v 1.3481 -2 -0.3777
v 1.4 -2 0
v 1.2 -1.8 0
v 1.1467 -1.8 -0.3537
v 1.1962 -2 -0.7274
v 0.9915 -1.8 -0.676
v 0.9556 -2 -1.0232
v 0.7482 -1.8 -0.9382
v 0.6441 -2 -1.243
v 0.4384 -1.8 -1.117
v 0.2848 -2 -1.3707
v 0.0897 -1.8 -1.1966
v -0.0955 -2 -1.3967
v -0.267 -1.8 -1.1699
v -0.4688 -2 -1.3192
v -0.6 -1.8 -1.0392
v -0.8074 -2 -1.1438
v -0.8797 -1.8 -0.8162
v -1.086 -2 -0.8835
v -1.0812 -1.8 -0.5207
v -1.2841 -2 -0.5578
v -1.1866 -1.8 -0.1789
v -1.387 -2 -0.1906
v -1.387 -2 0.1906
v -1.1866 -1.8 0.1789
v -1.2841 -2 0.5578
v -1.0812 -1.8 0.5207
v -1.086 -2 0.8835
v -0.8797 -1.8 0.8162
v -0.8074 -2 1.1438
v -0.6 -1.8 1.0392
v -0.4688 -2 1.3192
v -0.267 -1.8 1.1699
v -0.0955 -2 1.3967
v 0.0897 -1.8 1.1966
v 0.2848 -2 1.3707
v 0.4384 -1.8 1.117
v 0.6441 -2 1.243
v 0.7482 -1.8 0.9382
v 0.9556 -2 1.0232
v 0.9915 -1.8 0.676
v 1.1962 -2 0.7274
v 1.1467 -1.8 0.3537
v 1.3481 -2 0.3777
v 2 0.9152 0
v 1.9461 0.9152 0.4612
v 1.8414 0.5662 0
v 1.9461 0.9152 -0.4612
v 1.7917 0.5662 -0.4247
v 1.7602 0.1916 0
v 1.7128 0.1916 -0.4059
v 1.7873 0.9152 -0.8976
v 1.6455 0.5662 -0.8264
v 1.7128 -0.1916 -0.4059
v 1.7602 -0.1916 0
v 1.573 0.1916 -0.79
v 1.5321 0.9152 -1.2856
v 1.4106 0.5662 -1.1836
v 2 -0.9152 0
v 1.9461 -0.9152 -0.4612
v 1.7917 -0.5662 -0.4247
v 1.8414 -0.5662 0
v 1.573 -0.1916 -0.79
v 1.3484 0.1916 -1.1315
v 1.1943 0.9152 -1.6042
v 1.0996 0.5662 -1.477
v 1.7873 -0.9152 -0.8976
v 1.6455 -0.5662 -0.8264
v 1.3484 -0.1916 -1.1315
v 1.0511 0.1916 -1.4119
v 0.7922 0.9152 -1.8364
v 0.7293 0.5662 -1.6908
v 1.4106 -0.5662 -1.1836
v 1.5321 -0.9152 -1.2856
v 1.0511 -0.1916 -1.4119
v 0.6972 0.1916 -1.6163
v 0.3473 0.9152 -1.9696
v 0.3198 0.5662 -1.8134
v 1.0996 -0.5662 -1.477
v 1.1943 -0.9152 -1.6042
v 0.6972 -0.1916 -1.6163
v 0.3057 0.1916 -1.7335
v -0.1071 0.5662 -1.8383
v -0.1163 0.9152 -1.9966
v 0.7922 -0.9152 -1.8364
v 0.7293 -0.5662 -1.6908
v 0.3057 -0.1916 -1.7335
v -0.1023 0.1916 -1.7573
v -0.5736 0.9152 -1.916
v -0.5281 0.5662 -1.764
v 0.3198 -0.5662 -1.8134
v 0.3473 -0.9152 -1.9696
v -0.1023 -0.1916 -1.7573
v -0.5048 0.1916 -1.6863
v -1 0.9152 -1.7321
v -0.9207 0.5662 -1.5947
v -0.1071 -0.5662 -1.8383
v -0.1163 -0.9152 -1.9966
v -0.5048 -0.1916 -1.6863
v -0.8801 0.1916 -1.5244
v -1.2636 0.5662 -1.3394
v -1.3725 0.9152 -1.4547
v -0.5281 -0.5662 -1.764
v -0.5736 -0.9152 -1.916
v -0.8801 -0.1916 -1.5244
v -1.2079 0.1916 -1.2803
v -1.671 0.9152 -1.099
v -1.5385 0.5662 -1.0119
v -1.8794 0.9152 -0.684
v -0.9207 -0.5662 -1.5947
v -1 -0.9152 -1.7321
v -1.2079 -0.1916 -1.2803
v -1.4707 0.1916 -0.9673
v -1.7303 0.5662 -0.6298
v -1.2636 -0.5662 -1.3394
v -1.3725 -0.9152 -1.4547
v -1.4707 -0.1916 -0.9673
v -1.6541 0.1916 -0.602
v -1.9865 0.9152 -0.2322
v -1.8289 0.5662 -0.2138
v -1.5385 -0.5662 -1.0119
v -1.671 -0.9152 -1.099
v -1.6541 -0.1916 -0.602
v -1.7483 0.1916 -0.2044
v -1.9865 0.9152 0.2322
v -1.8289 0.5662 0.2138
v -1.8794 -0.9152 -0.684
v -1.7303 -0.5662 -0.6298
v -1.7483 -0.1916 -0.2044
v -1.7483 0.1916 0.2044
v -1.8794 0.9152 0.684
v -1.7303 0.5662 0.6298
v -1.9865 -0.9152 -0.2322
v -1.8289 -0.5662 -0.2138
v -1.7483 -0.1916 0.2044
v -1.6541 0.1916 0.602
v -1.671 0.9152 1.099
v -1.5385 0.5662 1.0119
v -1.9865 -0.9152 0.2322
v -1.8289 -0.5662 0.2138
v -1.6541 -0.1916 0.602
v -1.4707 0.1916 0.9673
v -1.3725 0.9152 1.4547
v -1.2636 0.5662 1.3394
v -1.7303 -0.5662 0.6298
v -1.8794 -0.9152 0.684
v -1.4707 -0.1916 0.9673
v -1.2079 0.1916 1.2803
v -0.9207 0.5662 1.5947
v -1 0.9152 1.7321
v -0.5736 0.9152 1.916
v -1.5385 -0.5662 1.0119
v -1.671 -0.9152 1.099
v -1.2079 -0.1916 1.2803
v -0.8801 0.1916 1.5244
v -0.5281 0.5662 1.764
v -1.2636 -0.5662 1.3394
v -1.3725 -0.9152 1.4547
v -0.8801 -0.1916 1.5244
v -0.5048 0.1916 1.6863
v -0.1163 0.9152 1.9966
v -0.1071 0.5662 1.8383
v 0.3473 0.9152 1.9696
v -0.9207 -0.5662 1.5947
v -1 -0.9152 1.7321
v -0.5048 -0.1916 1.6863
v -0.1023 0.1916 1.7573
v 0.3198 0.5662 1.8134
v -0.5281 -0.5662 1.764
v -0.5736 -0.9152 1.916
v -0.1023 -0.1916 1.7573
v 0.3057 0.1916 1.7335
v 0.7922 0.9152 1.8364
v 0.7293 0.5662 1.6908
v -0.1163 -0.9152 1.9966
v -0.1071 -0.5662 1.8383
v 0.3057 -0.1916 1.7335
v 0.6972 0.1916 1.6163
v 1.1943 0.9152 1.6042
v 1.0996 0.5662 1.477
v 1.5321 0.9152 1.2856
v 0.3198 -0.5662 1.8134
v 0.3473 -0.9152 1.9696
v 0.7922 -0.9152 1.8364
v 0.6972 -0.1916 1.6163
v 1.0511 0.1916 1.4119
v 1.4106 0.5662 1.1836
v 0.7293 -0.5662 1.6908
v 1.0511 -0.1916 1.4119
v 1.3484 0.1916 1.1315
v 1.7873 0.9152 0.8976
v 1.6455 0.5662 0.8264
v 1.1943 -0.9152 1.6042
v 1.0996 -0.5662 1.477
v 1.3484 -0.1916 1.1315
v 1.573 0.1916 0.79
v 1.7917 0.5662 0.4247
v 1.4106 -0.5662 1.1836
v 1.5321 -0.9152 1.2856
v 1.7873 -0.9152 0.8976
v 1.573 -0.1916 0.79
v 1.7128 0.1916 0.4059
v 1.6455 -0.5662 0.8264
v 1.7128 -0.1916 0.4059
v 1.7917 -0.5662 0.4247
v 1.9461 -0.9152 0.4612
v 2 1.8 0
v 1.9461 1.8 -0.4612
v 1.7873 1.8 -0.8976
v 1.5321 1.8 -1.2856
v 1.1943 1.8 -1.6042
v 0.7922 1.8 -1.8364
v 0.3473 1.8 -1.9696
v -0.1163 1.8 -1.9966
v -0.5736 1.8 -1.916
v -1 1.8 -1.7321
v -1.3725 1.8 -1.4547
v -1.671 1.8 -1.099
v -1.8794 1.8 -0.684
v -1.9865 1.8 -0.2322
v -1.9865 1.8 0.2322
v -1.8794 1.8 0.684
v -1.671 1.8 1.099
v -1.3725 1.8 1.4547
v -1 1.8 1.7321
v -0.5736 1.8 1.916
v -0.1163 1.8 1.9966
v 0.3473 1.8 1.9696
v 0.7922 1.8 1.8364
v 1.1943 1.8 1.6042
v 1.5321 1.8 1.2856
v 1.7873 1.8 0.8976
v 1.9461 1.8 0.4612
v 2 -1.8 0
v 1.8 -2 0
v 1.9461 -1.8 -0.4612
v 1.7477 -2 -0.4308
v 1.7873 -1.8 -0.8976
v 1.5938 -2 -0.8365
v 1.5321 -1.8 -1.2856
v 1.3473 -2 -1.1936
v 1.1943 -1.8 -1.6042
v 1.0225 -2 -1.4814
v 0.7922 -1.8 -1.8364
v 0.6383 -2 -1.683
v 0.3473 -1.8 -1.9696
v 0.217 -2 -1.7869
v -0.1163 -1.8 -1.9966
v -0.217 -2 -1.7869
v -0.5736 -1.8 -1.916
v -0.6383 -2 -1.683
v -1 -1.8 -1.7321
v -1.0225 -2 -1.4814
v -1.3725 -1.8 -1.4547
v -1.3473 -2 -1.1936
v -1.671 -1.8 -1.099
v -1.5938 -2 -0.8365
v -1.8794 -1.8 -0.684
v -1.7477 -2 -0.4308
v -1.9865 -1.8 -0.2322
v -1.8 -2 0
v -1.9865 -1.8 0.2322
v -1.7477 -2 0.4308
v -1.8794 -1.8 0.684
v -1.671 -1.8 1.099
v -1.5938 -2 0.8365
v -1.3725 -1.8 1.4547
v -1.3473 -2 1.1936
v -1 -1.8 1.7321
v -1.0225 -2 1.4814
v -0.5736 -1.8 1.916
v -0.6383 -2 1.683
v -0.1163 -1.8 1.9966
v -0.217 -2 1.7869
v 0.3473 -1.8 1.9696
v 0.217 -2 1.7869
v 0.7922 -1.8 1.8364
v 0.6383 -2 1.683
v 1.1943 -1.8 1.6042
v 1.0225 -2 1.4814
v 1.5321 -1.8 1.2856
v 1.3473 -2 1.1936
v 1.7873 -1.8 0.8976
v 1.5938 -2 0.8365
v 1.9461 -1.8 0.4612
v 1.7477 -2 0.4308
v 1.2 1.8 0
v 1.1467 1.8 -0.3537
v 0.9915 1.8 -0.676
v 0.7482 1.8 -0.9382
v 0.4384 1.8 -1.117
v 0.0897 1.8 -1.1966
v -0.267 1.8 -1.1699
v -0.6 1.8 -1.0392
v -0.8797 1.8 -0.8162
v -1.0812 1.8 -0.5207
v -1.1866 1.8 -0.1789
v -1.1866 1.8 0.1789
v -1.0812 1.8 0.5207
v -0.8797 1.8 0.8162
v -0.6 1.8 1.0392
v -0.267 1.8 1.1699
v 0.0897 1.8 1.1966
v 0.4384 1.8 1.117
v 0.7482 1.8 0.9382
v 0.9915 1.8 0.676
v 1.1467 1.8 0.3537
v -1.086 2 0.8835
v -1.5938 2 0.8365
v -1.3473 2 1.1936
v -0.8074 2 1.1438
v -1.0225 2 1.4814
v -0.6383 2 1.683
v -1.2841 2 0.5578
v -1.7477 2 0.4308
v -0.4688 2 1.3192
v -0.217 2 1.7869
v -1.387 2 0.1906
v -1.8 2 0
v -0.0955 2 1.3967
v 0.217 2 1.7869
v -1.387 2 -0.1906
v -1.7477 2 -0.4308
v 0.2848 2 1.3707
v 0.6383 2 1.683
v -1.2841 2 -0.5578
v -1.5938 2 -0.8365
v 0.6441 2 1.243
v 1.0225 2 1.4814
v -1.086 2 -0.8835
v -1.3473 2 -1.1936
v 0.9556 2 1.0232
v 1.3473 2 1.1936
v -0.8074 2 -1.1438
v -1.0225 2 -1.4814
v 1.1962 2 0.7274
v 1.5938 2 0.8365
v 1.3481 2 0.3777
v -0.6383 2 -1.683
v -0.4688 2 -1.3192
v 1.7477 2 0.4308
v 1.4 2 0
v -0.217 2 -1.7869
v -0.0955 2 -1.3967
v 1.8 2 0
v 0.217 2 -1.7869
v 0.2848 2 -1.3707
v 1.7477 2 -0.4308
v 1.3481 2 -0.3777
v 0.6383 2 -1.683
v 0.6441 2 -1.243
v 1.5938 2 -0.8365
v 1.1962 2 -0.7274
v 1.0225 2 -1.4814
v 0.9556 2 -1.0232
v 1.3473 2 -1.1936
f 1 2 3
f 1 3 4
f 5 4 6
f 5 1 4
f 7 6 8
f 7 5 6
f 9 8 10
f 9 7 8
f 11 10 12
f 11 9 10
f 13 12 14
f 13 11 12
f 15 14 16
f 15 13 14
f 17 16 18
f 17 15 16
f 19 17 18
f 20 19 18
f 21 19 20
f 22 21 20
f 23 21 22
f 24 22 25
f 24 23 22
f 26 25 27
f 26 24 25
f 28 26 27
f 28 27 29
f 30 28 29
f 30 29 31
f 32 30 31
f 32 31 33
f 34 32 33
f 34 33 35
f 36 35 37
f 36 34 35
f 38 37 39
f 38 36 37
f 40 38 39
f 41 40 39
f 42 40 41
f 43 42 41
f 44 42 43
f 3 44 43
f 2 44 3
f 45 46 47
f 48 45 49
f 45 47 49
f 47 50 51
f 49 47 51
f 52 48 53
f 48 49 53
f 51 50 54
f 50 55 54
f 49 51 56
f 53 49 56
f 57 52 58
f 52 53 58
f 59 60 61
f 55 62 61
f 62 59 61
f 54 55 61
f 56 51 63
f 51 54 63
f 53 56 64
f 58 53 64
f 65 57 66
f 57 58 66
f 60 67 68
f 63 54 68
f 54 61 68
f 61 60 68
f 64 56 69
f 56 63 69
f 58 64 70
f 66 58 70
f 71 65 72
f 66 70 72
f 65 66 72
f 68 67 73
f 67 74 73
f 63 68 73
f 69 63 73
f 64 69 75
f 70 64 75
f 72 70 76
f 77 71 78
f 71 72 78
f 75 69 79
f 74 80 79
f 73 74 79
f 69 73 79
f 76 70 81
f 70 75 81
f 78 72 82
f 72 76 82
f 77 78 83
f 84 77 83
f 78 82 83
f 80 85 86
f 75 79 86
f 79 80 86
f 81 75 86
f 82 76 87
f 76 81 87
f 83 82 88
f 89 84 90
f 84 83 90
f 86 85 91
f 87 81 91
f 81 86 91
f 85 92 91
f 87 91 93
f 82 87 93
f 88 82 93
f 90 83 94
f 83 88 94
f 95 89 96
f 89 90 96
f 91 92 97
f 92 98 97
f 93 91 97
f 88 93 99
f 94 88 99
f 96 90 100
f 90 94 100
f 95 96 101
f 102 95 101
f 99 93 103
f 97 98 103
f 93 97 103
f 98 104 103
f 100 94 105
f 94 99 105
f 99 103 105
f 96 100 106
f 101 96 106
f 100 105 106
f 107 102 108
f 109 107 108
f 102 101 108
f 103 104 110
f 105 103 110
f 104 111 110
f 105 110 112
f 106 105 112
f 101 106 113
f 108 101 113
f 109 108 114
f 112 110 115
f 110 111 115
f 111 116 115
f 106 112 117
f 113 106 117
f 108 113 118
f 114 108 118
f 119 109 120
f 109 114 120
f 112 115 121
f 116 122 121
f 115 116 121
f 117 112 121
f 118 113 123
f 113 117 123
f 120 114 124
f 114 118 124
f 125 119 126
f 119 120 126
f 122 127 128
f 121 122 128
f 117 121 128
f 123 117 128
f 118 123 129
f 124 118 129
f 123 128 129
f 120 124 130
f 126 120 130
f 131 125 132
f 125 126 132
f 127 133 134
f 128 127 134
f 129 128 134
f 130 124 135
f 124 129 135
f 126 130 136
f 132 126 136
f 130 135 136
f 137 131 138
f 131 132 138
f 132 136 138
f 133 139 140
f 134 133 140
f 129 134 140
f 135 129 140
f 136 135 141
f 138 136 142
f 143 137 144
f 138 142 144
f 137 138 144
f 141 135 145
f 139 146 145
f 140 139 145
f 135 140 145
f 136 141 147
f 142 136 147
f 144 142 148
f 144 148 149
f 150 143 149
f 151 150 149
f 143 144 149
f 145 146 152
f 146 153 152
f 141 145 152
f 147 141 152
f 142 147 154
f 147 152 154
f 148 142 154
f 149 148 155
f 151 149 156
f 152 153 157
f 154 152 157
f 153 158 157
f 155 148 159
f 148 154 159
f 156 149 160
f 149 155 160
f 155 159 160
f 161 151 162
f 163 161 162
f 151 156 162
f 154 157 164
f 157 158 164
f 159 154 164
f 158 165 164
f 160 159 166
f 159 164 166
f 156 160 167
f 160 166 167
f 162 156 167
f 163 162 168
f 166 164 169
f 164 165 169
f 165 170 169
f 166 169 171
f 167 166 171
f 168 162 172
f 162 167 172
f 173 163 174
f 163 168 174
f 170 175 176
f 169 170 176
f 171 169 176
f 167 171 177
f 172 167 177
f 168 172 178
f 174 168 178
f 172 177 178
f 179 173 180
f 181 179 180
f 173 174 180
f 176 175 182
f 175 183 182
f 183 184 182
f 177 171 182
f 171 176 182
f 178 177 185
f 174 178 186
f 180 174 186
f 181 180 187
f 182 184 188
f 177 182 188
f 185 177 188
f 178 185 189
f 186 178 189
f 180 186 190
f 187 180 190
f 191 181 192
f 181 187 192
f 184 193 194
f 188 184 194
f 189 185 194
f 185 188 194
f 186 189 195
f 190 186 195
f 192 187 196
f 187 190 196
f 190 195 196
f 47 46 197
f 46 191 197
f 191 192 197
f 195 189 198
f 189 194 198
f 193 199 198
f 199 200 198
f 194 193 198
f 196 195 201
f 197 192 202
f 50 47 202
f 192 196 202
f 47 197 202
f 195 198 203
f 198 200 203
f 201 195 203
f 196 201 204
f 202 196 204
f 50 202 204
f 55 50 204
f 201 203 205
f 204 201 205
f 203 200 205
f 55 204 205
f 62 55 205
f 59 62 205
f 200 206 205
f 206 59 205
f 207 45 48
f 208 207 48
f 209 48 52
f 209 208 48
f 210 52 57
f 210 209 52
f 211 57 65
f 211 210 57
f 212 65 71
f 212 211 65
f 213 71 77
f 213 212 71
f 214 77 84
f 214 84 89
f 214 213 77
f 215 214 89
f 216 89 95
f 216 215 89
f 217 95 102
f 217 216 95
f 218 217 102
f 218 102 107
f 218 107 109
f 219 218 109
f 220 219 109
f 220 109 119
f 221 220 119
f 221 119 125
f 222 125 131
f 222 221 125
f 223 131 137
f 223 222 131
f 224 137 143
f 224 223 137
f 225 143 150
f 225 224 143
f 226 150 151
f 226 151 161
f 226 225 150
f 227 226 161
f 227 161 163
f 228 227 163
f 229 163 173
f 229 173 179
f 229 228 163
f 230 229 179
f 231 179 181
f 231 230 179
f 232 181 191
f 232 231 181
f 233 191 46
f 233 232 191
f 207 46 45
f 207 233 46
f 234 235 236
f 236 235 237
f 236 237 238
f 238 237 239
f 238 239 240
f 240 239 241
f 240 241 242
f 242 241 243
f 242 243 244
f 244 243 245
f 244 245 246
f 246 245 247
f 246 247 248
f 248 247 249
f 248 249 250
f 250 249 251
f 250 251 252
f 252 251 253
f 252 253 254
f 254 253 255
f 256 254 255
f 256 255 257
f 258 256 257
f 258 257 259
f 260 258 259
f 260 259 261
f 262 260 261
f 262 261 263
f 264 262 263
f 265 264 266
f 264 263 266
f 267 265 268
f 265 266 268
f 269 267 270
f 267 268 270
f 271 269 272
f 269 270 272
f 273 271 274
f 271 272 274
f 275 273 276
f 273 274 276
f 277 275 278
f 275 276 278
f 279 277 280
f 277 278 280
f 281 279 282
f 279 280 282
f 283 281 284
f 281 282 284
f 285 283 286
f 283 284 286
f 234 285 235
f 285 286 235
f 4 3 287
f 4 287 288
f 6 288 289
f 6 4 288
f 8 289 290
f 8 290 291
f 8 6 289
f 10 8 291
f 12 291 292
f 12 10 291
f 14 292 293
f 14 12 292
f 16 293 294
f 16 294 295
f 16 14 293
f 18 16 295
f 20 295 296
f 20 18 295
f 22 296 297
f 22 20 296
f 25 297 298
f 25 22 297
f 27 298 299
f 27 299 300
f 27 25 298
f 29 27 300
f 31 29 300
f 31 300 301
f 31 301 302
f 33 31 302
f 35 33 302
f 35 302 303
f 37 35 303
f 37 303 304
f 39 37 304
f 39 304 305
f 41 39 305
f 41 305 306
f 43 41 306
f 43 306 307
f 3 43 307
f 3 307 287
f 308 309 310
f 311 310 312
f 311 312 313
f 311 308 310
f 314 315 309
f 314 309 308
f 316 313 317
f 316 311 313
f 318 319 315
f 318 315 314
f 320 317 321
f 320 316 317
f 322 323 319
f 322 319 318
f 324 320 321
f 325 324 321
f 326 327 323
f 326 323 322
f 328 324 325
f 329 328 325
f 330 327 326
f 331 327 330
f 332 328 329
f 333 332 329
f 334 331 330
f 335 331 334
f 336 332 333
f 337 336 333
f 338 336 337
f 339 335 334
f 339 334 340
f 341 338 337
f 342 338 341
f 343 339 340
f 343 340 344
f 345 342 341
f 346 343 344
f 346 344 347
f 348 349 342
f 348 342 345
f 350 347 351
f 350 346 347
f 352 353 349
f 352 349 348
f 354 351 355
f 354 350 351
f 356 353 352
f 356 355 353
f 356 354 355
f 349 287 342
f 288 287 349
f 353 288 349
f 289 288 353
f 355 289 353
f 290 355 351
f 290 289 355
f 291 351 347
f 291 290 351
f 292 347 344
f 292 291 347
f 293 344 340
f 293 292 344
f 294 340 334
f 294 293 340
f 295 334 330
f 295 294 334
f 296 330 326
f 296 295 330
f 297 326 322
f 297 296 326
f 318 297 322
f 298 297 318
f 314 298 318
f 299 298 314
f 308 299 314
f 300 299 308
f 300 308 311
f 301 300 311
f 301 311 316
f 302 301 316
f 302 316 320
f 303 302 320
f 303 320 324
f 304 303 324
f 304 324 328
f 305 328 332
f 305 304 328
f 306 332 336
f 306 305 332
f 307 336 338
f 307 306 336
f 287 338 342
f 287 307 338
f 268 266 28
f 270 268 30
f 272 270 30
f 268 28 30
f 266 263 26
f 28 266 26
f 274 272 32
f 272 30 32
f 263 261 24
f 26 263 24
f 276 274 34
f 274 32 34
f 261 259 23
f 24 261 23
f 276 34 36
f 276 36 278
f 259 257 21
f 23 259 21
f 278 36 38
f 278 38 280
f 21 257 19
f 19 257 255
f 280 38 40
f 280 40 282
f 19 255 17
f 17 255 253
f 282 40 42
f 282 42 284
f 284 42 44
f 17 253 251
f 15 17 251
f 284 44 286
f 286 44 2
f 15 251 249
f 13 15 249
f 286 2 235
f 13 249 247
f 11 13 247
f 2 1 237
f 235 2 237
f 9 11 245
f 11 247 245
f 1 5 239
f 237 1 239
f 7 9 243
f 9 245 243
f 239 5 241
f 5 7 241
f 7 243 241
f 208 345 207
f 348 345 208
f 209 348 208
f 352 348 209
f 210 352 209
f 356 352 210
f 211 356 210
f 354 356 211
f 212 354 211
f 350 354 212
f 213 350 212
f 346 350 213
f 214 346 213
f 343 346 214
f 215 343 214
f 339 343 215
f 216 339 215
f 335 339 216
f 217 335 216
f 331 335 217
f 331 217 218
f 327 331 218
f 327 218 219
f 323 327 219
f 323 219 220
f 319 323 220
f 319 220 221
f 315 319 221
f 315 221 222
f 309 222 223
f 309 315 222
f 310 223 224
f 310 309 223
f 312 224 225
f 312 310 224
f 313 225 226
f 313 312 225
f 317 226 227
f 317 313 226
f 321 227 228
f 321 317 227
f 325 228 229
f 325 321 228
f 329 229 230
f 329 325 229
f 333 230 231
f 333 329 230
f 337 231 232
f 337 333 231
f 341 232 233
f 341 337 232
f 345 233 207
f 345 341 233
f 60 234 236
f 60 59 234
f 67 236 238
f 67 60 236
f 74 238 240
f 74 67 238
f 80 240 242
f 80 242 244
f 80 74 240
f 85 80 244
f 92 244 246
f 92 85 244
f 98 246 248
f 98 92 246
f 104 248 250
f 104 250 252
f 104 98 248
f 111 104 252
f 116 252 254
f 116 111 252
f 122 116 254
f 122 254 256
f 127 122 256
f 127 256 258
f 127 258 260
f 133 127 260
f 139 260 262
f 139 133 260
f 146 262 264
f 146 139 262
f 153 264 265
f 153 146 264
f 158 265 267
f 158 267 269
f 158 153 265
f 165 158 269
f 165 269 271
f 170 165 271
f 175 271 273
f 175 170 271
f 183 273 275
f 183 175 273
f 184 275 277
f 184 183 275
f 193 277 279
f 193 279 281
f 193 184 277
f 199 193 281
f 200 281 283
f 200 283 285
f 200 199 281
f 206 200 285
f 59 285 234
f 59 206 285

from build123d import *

# Parameters (mm, degrees)
SKETCH1_R           = 2
SKETCH1_R_2         = 1.2
BOSS_EXTRUDE1_DEPTH = 2
CHAMFER1_SIZE       = 0.2
SKETCH2_R           = 1.8


with BuildPart() as part:
    # Sketch1 → Boss-Extrude1 (new body, symmetric)
    with BuildSketch(Plane(origin=(0, 0, 0), x_dir=(1, 0, 0), z_dir=(0, 1, 0))):
        Circle(SKETCH1_R)
        Circle(SKETCH1_R_2, mode=Mode.SUBTRACT)
    extrude(amount=BOSS_EXTRUDE1_DEPTH, both=True)

    # Chamfer1
    chamfer1_edges = [part.edges().sort_by_distance(p)[0] for p in [
        (-2, -2, 0),
        (-2, 2, 0),
        (-1.2, -2, 0),
        (-1.2, 2, 0),
    ]]
    chamfer(chamfer1_edges, length=CHAMFER1_SIZE)

    # Cut-Sweep1: sweep along a path in Sketch3
    with BuildLine(Plane(origin=(0, 0, 0), x_dir=(1, 0, 0), z_dir=(0, 1, 0))) as cut_sweep1_path:
        CenterArc((0, 0), 3.553150672, 0, 360)
    # Sketch2 → Cut-Sweep1 (sweep, cut)
    with BuildSketch(Plane(origin=(0, 0, 0), x_dir=(0, 0, -1), z_dir=(1, 0, 0))):
        with Locations((3.55, 0)):
            Circle(SKETCH2_R)
    sweep(path=cut_sweep1_path.line, mode=Mode.SUBTRACT)


solid = part.part
